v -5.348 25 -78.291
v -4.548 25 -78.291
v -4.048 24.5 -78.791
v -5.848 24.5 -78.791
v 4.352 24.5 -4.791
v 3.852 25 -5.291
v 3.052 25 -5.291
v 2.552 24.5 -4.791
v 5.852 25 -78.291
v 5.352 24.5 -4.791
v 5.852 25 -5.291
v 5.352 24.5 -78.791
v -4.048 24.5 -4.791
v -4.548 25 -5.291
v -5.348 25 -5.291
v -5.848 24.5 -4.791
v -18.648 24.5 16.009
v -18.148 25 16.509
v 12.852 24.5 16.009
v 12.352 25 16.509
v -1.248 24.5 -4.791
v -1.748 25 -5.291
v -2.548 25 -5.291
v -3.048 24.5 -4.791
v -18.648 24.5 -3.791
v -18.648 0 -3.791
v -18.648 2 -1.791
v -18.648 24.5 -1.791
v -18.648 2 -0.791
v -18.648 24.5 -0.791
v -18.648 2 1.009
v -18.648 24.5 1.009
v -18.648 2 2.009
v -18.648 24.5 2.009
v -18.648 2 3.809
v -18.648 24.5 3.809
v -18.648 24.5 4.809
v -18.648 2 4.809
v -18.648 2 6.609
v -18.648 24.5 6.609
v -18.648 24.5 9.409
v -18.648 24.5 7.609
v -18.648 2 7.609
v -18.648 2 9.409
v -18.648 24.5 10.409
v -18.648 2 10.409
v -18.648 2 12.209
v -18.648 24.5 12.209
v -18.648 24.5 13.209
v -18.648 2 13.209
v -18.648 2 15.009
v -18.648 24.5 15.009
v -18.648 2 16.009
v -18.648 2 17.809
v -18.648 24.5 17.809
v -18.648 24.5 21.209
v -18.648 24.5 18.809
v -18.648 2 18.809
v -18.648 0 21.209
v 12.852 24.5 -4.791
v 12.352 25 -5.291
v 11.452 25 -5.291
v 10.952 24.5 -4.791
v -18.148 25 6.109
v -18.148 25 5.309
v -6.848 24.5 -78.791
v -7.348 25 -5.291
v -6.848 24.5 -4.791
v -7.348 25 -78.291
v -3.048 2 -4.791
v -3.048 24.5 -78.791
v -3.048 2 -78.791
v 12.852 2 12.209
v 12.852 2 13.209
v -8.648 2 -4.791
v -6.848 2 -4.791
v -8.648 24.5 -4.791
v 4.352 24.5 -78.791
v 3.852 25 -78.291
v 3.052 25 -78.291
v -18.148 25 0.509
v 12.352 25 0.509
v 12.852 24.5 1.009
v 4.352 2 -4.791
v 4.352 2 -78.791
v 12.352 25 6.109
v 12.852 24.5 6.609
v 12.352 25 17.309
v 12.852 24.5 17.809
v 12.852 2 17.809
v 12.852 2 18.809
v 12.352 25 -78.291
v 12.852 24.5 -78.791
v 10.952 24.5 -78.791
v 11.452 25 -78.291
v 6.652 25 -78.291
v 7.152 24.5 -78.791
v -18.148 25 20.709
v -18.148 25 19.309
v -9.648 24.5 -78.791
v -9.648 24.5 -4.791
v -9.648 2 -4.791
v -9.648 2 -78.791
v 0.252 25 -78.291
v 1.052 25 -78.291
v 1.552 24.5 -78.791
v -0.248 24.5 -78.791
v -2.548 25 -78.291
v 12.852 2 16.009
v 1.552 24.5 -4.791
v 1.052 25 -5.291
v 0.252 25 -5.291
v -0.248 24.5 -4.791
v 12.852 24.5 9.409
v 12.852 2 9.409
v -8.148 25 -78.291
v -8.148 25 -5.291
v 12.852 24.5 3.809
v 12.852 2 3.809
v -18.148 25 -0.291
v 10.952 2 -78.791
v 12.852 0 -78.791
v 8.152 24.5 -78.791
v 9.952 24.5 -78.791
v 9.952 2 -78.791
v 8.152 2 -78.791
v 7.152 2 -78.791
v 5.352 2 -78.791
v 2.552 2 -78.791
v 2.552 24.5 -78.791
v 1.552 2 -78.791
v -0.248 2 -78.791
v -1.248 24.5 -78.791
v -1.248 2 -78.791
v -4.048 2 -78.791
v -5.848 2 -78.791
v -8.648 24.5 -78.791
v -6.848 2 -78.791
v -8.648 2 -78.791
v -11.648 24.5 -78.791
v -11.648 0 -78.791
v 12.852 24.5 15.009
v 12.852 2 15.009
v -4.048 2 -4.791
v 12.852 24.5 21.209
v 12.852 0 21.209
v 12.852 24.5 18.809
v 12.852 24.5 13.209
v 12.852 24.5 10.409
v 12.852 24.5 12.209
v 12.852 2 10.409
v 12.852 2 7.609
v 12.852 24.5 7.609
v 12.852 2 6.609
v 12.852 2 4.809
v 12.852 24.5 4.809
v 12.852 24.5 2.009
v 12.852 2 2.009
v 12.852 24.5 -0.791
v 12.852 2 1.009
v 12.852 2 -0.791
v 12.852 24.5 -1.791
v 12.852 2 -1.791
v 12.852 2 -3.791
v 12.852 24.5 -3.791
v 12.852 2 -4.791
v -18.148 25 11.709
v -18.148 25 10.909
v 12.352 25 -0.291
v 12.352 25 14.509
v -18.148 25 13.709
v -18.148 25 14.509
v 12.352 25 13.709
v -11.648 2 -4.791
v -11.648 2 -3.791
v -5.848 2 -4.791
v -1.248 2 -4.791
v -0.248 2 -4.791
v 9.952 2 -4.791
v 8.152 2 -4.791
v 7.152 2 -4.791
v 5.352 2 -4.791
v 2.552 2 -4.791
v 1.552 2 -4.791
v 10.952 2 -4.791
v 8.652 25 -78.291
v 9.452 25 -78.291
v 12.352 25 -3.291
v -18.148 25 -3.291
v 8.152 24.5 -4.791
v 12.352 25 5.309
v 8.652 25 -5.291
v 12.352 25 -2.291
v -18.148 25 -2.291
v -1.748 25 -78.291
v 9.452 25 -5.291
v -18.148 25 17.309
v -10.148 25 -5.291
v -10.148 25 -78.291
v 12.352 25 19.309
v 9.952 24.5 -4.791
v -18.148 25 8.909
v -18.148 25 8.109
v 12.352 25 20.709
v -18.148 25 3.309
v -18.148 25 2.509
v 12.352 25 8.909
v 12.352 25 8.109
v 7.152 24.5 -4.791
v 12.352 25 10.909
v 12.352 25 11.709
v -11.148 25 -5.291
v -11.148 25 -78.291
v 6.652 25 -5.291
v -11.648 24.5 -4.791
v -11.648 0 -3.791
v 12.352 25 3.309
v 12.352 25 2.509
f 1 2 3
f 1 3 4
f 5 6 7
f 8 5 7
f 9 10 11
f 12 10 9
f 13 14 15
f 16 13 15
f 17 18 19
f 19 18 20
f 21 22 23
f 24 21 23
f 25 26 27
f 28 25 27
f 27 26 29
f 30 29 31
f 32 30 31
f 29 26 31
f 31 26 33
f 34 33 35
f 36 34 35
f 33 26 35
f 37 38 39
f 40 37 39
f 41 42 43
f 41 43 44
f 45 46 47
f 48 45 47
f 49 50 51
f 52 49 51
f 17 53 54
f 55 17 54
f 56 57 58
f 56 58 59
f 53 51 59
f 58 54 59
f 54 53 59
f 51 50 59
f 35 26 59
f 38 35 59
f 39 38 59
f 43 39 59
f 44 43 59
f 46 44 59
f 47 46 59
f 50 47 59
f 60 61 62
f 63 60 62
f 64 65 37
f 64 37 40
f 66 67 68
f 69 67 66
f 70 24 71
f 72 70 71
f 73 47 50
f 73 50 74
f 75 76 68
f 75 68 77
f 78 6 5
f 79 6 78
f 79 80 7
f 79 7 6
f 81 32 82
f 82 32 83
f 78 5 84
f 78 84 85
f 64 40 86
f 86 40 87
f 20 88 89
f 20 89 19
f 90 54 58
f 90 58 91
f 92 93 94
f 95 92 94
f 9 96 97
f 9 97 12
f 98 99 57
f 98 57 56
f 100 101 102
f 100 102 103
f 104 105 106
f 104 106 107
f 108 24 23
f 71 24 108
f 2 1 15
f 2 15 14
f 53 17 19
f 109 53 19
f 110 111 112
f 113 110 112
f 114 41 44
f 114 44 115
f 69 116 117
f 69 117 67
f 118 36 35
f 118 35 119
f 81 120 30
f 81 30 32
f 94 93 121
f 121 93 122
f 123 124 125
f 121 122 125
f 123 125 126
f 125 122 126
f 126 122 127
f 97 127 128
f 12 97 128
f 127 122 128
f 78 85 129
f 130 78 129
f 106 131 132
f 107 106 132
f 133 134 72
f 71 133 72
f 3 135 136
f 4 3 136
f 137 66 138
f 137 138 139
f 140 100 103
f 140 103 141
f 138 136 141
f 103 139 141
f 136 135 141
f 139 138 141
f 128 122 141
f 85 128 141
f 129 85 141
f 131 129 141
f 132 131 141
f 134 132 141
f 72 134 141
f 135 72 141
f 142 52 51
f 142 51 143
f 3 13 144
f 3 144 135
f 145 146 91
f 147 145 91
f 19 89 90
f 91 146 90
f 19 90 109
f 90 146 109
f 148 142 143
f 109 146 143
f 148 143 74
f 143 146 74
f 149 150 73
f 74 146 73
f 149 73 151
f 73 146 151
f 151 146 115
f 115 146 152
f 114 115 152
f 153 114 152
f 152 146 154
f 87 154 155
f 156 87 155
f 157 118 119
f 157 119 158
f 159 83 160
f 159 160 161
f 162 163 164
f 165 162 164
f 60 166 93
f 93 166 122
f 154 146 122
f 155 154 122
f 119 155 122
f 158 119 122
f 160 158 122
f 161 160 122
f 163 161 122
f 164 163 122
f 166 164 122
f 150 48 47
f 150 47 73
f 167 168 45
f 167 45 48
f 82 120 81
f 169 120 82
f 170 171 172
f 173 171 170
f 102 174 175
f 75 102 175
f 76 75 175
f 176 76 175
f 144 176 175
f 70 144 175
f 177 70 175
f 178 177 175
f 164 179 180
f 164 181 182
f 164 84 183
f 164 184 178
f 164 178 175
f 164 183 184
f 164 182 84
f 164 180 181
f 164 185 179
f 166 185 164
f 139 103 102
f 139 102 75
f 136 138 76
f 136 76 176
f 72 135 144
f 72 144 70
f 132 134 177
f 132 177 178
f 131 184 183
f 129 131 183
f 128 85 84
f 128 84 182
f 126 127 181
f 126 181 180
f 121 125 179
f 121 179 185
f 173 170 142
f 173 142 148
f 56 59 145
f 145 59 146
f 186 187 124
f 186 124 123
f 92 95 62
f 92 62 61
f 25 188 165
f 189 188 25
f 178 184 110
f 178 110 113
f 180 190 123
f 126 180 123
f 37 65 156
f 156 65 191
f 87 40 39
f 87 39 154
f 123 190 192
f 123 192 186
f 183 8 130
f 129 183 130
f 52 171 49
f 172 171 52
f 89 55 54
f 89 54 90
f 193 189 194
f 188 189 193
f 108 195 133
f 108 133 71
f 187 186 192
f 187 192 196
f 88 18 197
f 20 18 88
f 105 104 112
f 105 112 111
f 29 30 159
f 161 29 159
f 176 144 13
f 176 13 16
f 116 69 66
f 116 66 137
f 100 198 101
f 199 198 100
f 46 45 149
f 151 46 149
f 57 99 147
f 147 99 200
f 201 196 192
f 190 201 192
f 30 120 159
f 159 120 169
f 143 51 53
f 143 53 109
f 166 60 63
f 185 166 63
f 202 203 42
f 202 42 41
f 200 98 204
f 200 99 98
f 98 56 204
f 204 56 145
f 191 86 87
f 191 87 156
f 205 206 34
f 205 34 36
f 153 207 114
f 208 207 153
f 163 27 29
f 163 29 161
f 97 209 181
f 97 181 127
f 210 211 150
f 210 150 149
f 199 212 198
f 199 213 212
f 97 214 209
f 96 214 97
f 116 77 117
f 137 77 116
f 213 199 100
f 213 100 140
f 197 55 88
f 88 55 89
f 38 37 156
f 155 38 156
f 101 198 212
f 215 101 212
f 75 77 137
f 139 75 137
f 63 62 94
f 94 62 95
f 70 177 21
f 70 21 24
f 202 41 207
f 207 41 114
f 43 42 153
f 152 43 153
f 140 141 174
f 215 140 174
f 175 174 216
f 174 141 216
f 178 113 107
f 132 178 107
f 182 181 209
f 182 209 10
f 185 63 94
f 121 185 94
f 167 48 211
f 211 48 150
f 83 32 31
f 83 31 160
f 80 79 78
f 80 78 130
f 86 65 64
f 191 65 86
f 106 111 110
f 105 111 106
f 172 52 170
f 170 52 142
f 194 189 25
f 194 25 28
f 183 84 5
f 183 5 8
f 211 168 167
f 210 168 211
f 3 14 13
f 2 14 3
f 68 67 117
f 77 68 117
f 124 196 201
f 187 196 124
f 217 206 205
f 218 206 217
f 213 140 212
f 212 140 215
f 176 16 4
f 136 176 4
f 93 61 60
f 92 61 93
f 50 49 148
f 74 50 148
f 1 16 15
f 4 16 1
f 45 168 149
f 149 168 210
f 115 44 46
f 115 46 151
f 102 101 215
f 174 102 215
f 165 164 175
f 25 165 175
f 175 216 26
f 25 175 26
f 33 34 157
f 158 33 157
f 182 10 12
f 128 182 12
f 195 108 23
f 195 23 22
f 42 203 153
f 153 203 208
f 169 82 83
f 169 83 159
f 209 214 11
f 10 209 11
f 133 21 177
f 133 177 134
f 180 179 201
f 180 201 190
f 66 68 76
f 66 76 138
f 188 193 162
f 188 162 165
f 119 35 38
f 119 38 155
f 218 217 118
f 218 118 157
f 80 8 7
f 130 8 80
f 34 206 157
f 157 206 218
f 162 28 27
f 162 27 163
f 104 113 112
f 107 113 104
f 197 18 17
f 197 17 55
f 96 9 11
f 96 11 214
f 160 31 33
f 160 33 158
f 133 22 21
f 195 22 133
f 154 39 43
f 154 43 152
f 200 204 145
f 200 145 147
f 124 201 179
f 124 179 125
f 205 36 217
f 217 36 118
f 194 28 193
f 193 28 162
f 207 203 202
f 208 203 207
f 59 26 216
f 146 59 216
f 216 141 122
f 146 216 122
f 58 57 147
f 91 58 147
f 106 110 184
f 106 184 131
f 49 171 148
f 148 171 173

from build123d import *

# Parameters (mm, degrees)
BOSS_EXTRUDE1_DEPTH = 25
SKETCH2_W           = 1
SKETCH2_H           = 74
SKETCH2_W_2         = 31.5
SKETCH2_H_2         = 1
CUT_EXTRUDE1_DEPTH  = 23
CHAMFER1_SIZE       = 0.5


with BuildPart() as part:
    # Sketch1 → Boss-Extrude1 (new body)
    with BuildSketch(Plane(origin=(0, 0, 0), x_dir=(1, 0, 0), z_dir=(0, 1, 0))):
        Polygon((-18.647540984, 3.790983607), (-18.647540984, -21.209016393), (12.852459016, -21.209016393), (12.852459016, 78.790983607), (-11.647540984, 78.790983607), (-11.647540984, 3.790983607), align=None)
    extrude(amount=BOSS_EXTRUDE1_DEPTH)

    # Sketch2 → Cut-Extrude1 (cut)
    with BuildSketch(Plane(origin=(0, 25, 0), x_dir=(1, 0, 0), z_dir=(0, 1, 0))):
        with Locations((-9.147540984, 41.790983607)):
            Rectangle(SKETCH2_W, SKETCH2_H)
        with Locations((-6.347540984, 41.790983607)):
            Rectangle(SKETCH2_W, SKETCH2_H)
        with Locations((-3.547540984, 41.790983607)):
            Rectangle(SKETCH2_W, SKETCH2_H)
        with Locations((-0.747540984, 41.790983607)):
            Rectangle(SKETCH2_W, SKETCH2_H)
        with Locations((2.052459016, 41.790983607)):
            Rectangle(SKETCH2_W, SKETCH2_H)
        with Locations((4.852459016, 41.790983607)):
            Rectangle(SKETCH2_W, SKETCH2_H)
        with Locations((7.652459016, 41.790983607)):
            Rectangle(SKETCH2_W, SKETCH2_H)
        with Locations((10.452459016, 41.790983607)):
            Rectangle(SKETCH2_W, SKETCH2_H)
        Polygon((-11.647540984, 4.790983607), (-11.647540984, 3.790983607), (12.852459016, 3.790983607), (12.852459016, 4.790983607), (10.952459016, 4.790983607), (9.952459016, 4.790983607), (8.152459016, 4.790983607), (7.152459016, 4.790983607), (5.352459016, 4.790983607), (4.352459016, 4.790983607), (2.552459016, 4.790983607), (1.552459016, 4.790983607), (-0.247540984, 4.790983607), (-1.247540984, 4.790983607), (-3.047540984, 4.790983607), (-4.047540984, 4.790983607), (-5.847540984, 4.790983607), (-6.847540984, 4.790983607), (-8.647540984, 4.790983607), (-9.647540984, 4.790983607), align=None)
        with Locations((-2.897540984, 1.290983607)):
            Rectangle(SKETCH2_W_2, SKETCH2_H_2)
        with Locations((-2.897540984, -1.509016393)):
            Rectangle(SKETCH2_W_2, SKETCH2_H_2)
        with Locations((-2.897540984, -4.309016393)):
            Rectangle(SKETCH2_W_2, SKETCH2_H_2)
        with Locations((-2.897540984, -7.109016393)):
            Rectangle(SKETCH2_W_2, SKETCH2_H_2)
        with Locations((-2.897540984, -9.909016393)):
            Rectangle(SKETCH2_W_2, SKETCH2_H_2)
        with Locations((-2.897540984, -18.309016393)):
            Rectangle(SKETCH2_W_2, SKETCH2_H_2)
        with Locations((-2.897540984, -15.509016393)):
            Rectangle(SKETCH2_W_2, SKETCH2_H_2)
        with Locations((-2.897540984, -12.709016393)):
            Rectangle(SKETCH2_W_2, SKETCH2_H_2)
    extrude(amount=-CUT_EXTRUDE1_DEPTH, mode=Mode.SUBTRACT)

    # Chamfer1
    chamfer1_edges = [part.edges().sort_by_distance(p)[0] for p in [
        (5.352459016, 25, -41.790983607),
        (6.252459016, 25, -4.790983607),
        (8.152459016, 25, -41.790983607),
        (9.052459016, 25, -4.790983607),
        (10.952459016, 25, -41.790983607),
        (11.902459016, 25, -4.790983607),
        (-10.647540984, 25, -4.790983607),
        (-9.647540984, 25, -41.790983607),
        (9.952459016, 25, -41.790983607),
        (7.152459016, 25, -41.790983607),
        (4.352459016, 25, -41.790983607),
        (1.552459016, 25, -41.790983607),
        (-1.247540984, 25, -41.790983607),
        (-4.047540984, 25, -41.790983607),
        (-2.897540984, 25, 21.209016393),
        (-6.847540984, 25, -41.790983607),
        (-2.897540984, 25, -1.790983607),
        (-2.897540984, 25, -0.790983607),
        (12.852459016, 25, 20.009016393),
        (-2.897540984, 25, 1.009016393),
        (-2.897540984, 25, 2.009016393),
        (-2.897540984, 25, 3.809016393),
        (-2.897540984, 25, 4.809016393),
        (-2.897540984, 25, 6.609016393),
        (-2.897540984, 25, 7.609016393),
        (-2.897540984, 25, 12.209016393),
        (-2.897540984, 25, 13.209016393),
        (-18.647540984, 25, 0.109016393),
        (-2.897540984, 25, 15.009016393),
        (-2.897540984, 25, 16.009016393),
        (-18.647540984, 25, 2.909016393),
        (-2.897540984, 25, 17.809016393),
        (-2.897540984, 25, 18.809016393),
        (-18.647540984, 25, 5.709016393),
        (-2.897540984, 25, 9.409016393),
        (11.902459016, 25, -78.790983607),
        (-2.897540984, 25, 10.409016393),
        (-18.647540984, 25, 8.509016393),
        (-18.647540984, 25, 11.309016393),
        (-18.647540984, 25, 14.109016393),
        (-18.647540984, 25, 16.909016393),
        (-18.647540984, 25, 20.009016393),
        (12.852459016, 25, 16.909016393),
        (12.852459016, 25, 14.109016393),
        (-11.647540984, 25, -41.790983607),
        (12.852459016, 25, 11.309016393),
        (12.852459016, 25, 8.509016393),
        (12.852459016, 25, 5.709016393),
        (12.852459016, 25, 2.909016393),
        (12.852459016, 25, 0.109016393),
        (12.852459016, 25, -2.790983607),
        (12.852459016, 25, -41.790983607),
        (9.052459016, 25, -78.790983607),
        (6.252459016, 25, -78.790983607),
        (3.452459016, 25, -78.790983607),
        (0.652459016, 25, -78.790983607),
        (-2.147540984, 25, -78.790983607),
        (-4.947540984, 25, -78.790983607),
        (-7.747540984, 25, -78.790983607),
        (-10.647540984, 25, -78.790983607),
        (-2.897540984, 25, -3.790983607),
        (-8.647540984, 25, -41.790983607),
        (-7.747540984, 25, -4.790983607),
        (-18.647540984, 25, -2.790983607),
        (-5.847540984, 25, -41.790983607),
        (-4.947540984, 25, -4.790983607),
        (-3.047540984, 25, -41.790983607),
        (-2.147540984, 25, -4.790983607),
        (-0.247540984, 25, -41.790983607),
        (0.652459016, 25, -4.790983607),
        (2.552459016, 25, -41.790983607),
        (3.452459016, 25, -4.790983607),
    ]]
    chamfer(chamfer1_edges, length=CHAMFER1_SIZE)


solid = part.part
